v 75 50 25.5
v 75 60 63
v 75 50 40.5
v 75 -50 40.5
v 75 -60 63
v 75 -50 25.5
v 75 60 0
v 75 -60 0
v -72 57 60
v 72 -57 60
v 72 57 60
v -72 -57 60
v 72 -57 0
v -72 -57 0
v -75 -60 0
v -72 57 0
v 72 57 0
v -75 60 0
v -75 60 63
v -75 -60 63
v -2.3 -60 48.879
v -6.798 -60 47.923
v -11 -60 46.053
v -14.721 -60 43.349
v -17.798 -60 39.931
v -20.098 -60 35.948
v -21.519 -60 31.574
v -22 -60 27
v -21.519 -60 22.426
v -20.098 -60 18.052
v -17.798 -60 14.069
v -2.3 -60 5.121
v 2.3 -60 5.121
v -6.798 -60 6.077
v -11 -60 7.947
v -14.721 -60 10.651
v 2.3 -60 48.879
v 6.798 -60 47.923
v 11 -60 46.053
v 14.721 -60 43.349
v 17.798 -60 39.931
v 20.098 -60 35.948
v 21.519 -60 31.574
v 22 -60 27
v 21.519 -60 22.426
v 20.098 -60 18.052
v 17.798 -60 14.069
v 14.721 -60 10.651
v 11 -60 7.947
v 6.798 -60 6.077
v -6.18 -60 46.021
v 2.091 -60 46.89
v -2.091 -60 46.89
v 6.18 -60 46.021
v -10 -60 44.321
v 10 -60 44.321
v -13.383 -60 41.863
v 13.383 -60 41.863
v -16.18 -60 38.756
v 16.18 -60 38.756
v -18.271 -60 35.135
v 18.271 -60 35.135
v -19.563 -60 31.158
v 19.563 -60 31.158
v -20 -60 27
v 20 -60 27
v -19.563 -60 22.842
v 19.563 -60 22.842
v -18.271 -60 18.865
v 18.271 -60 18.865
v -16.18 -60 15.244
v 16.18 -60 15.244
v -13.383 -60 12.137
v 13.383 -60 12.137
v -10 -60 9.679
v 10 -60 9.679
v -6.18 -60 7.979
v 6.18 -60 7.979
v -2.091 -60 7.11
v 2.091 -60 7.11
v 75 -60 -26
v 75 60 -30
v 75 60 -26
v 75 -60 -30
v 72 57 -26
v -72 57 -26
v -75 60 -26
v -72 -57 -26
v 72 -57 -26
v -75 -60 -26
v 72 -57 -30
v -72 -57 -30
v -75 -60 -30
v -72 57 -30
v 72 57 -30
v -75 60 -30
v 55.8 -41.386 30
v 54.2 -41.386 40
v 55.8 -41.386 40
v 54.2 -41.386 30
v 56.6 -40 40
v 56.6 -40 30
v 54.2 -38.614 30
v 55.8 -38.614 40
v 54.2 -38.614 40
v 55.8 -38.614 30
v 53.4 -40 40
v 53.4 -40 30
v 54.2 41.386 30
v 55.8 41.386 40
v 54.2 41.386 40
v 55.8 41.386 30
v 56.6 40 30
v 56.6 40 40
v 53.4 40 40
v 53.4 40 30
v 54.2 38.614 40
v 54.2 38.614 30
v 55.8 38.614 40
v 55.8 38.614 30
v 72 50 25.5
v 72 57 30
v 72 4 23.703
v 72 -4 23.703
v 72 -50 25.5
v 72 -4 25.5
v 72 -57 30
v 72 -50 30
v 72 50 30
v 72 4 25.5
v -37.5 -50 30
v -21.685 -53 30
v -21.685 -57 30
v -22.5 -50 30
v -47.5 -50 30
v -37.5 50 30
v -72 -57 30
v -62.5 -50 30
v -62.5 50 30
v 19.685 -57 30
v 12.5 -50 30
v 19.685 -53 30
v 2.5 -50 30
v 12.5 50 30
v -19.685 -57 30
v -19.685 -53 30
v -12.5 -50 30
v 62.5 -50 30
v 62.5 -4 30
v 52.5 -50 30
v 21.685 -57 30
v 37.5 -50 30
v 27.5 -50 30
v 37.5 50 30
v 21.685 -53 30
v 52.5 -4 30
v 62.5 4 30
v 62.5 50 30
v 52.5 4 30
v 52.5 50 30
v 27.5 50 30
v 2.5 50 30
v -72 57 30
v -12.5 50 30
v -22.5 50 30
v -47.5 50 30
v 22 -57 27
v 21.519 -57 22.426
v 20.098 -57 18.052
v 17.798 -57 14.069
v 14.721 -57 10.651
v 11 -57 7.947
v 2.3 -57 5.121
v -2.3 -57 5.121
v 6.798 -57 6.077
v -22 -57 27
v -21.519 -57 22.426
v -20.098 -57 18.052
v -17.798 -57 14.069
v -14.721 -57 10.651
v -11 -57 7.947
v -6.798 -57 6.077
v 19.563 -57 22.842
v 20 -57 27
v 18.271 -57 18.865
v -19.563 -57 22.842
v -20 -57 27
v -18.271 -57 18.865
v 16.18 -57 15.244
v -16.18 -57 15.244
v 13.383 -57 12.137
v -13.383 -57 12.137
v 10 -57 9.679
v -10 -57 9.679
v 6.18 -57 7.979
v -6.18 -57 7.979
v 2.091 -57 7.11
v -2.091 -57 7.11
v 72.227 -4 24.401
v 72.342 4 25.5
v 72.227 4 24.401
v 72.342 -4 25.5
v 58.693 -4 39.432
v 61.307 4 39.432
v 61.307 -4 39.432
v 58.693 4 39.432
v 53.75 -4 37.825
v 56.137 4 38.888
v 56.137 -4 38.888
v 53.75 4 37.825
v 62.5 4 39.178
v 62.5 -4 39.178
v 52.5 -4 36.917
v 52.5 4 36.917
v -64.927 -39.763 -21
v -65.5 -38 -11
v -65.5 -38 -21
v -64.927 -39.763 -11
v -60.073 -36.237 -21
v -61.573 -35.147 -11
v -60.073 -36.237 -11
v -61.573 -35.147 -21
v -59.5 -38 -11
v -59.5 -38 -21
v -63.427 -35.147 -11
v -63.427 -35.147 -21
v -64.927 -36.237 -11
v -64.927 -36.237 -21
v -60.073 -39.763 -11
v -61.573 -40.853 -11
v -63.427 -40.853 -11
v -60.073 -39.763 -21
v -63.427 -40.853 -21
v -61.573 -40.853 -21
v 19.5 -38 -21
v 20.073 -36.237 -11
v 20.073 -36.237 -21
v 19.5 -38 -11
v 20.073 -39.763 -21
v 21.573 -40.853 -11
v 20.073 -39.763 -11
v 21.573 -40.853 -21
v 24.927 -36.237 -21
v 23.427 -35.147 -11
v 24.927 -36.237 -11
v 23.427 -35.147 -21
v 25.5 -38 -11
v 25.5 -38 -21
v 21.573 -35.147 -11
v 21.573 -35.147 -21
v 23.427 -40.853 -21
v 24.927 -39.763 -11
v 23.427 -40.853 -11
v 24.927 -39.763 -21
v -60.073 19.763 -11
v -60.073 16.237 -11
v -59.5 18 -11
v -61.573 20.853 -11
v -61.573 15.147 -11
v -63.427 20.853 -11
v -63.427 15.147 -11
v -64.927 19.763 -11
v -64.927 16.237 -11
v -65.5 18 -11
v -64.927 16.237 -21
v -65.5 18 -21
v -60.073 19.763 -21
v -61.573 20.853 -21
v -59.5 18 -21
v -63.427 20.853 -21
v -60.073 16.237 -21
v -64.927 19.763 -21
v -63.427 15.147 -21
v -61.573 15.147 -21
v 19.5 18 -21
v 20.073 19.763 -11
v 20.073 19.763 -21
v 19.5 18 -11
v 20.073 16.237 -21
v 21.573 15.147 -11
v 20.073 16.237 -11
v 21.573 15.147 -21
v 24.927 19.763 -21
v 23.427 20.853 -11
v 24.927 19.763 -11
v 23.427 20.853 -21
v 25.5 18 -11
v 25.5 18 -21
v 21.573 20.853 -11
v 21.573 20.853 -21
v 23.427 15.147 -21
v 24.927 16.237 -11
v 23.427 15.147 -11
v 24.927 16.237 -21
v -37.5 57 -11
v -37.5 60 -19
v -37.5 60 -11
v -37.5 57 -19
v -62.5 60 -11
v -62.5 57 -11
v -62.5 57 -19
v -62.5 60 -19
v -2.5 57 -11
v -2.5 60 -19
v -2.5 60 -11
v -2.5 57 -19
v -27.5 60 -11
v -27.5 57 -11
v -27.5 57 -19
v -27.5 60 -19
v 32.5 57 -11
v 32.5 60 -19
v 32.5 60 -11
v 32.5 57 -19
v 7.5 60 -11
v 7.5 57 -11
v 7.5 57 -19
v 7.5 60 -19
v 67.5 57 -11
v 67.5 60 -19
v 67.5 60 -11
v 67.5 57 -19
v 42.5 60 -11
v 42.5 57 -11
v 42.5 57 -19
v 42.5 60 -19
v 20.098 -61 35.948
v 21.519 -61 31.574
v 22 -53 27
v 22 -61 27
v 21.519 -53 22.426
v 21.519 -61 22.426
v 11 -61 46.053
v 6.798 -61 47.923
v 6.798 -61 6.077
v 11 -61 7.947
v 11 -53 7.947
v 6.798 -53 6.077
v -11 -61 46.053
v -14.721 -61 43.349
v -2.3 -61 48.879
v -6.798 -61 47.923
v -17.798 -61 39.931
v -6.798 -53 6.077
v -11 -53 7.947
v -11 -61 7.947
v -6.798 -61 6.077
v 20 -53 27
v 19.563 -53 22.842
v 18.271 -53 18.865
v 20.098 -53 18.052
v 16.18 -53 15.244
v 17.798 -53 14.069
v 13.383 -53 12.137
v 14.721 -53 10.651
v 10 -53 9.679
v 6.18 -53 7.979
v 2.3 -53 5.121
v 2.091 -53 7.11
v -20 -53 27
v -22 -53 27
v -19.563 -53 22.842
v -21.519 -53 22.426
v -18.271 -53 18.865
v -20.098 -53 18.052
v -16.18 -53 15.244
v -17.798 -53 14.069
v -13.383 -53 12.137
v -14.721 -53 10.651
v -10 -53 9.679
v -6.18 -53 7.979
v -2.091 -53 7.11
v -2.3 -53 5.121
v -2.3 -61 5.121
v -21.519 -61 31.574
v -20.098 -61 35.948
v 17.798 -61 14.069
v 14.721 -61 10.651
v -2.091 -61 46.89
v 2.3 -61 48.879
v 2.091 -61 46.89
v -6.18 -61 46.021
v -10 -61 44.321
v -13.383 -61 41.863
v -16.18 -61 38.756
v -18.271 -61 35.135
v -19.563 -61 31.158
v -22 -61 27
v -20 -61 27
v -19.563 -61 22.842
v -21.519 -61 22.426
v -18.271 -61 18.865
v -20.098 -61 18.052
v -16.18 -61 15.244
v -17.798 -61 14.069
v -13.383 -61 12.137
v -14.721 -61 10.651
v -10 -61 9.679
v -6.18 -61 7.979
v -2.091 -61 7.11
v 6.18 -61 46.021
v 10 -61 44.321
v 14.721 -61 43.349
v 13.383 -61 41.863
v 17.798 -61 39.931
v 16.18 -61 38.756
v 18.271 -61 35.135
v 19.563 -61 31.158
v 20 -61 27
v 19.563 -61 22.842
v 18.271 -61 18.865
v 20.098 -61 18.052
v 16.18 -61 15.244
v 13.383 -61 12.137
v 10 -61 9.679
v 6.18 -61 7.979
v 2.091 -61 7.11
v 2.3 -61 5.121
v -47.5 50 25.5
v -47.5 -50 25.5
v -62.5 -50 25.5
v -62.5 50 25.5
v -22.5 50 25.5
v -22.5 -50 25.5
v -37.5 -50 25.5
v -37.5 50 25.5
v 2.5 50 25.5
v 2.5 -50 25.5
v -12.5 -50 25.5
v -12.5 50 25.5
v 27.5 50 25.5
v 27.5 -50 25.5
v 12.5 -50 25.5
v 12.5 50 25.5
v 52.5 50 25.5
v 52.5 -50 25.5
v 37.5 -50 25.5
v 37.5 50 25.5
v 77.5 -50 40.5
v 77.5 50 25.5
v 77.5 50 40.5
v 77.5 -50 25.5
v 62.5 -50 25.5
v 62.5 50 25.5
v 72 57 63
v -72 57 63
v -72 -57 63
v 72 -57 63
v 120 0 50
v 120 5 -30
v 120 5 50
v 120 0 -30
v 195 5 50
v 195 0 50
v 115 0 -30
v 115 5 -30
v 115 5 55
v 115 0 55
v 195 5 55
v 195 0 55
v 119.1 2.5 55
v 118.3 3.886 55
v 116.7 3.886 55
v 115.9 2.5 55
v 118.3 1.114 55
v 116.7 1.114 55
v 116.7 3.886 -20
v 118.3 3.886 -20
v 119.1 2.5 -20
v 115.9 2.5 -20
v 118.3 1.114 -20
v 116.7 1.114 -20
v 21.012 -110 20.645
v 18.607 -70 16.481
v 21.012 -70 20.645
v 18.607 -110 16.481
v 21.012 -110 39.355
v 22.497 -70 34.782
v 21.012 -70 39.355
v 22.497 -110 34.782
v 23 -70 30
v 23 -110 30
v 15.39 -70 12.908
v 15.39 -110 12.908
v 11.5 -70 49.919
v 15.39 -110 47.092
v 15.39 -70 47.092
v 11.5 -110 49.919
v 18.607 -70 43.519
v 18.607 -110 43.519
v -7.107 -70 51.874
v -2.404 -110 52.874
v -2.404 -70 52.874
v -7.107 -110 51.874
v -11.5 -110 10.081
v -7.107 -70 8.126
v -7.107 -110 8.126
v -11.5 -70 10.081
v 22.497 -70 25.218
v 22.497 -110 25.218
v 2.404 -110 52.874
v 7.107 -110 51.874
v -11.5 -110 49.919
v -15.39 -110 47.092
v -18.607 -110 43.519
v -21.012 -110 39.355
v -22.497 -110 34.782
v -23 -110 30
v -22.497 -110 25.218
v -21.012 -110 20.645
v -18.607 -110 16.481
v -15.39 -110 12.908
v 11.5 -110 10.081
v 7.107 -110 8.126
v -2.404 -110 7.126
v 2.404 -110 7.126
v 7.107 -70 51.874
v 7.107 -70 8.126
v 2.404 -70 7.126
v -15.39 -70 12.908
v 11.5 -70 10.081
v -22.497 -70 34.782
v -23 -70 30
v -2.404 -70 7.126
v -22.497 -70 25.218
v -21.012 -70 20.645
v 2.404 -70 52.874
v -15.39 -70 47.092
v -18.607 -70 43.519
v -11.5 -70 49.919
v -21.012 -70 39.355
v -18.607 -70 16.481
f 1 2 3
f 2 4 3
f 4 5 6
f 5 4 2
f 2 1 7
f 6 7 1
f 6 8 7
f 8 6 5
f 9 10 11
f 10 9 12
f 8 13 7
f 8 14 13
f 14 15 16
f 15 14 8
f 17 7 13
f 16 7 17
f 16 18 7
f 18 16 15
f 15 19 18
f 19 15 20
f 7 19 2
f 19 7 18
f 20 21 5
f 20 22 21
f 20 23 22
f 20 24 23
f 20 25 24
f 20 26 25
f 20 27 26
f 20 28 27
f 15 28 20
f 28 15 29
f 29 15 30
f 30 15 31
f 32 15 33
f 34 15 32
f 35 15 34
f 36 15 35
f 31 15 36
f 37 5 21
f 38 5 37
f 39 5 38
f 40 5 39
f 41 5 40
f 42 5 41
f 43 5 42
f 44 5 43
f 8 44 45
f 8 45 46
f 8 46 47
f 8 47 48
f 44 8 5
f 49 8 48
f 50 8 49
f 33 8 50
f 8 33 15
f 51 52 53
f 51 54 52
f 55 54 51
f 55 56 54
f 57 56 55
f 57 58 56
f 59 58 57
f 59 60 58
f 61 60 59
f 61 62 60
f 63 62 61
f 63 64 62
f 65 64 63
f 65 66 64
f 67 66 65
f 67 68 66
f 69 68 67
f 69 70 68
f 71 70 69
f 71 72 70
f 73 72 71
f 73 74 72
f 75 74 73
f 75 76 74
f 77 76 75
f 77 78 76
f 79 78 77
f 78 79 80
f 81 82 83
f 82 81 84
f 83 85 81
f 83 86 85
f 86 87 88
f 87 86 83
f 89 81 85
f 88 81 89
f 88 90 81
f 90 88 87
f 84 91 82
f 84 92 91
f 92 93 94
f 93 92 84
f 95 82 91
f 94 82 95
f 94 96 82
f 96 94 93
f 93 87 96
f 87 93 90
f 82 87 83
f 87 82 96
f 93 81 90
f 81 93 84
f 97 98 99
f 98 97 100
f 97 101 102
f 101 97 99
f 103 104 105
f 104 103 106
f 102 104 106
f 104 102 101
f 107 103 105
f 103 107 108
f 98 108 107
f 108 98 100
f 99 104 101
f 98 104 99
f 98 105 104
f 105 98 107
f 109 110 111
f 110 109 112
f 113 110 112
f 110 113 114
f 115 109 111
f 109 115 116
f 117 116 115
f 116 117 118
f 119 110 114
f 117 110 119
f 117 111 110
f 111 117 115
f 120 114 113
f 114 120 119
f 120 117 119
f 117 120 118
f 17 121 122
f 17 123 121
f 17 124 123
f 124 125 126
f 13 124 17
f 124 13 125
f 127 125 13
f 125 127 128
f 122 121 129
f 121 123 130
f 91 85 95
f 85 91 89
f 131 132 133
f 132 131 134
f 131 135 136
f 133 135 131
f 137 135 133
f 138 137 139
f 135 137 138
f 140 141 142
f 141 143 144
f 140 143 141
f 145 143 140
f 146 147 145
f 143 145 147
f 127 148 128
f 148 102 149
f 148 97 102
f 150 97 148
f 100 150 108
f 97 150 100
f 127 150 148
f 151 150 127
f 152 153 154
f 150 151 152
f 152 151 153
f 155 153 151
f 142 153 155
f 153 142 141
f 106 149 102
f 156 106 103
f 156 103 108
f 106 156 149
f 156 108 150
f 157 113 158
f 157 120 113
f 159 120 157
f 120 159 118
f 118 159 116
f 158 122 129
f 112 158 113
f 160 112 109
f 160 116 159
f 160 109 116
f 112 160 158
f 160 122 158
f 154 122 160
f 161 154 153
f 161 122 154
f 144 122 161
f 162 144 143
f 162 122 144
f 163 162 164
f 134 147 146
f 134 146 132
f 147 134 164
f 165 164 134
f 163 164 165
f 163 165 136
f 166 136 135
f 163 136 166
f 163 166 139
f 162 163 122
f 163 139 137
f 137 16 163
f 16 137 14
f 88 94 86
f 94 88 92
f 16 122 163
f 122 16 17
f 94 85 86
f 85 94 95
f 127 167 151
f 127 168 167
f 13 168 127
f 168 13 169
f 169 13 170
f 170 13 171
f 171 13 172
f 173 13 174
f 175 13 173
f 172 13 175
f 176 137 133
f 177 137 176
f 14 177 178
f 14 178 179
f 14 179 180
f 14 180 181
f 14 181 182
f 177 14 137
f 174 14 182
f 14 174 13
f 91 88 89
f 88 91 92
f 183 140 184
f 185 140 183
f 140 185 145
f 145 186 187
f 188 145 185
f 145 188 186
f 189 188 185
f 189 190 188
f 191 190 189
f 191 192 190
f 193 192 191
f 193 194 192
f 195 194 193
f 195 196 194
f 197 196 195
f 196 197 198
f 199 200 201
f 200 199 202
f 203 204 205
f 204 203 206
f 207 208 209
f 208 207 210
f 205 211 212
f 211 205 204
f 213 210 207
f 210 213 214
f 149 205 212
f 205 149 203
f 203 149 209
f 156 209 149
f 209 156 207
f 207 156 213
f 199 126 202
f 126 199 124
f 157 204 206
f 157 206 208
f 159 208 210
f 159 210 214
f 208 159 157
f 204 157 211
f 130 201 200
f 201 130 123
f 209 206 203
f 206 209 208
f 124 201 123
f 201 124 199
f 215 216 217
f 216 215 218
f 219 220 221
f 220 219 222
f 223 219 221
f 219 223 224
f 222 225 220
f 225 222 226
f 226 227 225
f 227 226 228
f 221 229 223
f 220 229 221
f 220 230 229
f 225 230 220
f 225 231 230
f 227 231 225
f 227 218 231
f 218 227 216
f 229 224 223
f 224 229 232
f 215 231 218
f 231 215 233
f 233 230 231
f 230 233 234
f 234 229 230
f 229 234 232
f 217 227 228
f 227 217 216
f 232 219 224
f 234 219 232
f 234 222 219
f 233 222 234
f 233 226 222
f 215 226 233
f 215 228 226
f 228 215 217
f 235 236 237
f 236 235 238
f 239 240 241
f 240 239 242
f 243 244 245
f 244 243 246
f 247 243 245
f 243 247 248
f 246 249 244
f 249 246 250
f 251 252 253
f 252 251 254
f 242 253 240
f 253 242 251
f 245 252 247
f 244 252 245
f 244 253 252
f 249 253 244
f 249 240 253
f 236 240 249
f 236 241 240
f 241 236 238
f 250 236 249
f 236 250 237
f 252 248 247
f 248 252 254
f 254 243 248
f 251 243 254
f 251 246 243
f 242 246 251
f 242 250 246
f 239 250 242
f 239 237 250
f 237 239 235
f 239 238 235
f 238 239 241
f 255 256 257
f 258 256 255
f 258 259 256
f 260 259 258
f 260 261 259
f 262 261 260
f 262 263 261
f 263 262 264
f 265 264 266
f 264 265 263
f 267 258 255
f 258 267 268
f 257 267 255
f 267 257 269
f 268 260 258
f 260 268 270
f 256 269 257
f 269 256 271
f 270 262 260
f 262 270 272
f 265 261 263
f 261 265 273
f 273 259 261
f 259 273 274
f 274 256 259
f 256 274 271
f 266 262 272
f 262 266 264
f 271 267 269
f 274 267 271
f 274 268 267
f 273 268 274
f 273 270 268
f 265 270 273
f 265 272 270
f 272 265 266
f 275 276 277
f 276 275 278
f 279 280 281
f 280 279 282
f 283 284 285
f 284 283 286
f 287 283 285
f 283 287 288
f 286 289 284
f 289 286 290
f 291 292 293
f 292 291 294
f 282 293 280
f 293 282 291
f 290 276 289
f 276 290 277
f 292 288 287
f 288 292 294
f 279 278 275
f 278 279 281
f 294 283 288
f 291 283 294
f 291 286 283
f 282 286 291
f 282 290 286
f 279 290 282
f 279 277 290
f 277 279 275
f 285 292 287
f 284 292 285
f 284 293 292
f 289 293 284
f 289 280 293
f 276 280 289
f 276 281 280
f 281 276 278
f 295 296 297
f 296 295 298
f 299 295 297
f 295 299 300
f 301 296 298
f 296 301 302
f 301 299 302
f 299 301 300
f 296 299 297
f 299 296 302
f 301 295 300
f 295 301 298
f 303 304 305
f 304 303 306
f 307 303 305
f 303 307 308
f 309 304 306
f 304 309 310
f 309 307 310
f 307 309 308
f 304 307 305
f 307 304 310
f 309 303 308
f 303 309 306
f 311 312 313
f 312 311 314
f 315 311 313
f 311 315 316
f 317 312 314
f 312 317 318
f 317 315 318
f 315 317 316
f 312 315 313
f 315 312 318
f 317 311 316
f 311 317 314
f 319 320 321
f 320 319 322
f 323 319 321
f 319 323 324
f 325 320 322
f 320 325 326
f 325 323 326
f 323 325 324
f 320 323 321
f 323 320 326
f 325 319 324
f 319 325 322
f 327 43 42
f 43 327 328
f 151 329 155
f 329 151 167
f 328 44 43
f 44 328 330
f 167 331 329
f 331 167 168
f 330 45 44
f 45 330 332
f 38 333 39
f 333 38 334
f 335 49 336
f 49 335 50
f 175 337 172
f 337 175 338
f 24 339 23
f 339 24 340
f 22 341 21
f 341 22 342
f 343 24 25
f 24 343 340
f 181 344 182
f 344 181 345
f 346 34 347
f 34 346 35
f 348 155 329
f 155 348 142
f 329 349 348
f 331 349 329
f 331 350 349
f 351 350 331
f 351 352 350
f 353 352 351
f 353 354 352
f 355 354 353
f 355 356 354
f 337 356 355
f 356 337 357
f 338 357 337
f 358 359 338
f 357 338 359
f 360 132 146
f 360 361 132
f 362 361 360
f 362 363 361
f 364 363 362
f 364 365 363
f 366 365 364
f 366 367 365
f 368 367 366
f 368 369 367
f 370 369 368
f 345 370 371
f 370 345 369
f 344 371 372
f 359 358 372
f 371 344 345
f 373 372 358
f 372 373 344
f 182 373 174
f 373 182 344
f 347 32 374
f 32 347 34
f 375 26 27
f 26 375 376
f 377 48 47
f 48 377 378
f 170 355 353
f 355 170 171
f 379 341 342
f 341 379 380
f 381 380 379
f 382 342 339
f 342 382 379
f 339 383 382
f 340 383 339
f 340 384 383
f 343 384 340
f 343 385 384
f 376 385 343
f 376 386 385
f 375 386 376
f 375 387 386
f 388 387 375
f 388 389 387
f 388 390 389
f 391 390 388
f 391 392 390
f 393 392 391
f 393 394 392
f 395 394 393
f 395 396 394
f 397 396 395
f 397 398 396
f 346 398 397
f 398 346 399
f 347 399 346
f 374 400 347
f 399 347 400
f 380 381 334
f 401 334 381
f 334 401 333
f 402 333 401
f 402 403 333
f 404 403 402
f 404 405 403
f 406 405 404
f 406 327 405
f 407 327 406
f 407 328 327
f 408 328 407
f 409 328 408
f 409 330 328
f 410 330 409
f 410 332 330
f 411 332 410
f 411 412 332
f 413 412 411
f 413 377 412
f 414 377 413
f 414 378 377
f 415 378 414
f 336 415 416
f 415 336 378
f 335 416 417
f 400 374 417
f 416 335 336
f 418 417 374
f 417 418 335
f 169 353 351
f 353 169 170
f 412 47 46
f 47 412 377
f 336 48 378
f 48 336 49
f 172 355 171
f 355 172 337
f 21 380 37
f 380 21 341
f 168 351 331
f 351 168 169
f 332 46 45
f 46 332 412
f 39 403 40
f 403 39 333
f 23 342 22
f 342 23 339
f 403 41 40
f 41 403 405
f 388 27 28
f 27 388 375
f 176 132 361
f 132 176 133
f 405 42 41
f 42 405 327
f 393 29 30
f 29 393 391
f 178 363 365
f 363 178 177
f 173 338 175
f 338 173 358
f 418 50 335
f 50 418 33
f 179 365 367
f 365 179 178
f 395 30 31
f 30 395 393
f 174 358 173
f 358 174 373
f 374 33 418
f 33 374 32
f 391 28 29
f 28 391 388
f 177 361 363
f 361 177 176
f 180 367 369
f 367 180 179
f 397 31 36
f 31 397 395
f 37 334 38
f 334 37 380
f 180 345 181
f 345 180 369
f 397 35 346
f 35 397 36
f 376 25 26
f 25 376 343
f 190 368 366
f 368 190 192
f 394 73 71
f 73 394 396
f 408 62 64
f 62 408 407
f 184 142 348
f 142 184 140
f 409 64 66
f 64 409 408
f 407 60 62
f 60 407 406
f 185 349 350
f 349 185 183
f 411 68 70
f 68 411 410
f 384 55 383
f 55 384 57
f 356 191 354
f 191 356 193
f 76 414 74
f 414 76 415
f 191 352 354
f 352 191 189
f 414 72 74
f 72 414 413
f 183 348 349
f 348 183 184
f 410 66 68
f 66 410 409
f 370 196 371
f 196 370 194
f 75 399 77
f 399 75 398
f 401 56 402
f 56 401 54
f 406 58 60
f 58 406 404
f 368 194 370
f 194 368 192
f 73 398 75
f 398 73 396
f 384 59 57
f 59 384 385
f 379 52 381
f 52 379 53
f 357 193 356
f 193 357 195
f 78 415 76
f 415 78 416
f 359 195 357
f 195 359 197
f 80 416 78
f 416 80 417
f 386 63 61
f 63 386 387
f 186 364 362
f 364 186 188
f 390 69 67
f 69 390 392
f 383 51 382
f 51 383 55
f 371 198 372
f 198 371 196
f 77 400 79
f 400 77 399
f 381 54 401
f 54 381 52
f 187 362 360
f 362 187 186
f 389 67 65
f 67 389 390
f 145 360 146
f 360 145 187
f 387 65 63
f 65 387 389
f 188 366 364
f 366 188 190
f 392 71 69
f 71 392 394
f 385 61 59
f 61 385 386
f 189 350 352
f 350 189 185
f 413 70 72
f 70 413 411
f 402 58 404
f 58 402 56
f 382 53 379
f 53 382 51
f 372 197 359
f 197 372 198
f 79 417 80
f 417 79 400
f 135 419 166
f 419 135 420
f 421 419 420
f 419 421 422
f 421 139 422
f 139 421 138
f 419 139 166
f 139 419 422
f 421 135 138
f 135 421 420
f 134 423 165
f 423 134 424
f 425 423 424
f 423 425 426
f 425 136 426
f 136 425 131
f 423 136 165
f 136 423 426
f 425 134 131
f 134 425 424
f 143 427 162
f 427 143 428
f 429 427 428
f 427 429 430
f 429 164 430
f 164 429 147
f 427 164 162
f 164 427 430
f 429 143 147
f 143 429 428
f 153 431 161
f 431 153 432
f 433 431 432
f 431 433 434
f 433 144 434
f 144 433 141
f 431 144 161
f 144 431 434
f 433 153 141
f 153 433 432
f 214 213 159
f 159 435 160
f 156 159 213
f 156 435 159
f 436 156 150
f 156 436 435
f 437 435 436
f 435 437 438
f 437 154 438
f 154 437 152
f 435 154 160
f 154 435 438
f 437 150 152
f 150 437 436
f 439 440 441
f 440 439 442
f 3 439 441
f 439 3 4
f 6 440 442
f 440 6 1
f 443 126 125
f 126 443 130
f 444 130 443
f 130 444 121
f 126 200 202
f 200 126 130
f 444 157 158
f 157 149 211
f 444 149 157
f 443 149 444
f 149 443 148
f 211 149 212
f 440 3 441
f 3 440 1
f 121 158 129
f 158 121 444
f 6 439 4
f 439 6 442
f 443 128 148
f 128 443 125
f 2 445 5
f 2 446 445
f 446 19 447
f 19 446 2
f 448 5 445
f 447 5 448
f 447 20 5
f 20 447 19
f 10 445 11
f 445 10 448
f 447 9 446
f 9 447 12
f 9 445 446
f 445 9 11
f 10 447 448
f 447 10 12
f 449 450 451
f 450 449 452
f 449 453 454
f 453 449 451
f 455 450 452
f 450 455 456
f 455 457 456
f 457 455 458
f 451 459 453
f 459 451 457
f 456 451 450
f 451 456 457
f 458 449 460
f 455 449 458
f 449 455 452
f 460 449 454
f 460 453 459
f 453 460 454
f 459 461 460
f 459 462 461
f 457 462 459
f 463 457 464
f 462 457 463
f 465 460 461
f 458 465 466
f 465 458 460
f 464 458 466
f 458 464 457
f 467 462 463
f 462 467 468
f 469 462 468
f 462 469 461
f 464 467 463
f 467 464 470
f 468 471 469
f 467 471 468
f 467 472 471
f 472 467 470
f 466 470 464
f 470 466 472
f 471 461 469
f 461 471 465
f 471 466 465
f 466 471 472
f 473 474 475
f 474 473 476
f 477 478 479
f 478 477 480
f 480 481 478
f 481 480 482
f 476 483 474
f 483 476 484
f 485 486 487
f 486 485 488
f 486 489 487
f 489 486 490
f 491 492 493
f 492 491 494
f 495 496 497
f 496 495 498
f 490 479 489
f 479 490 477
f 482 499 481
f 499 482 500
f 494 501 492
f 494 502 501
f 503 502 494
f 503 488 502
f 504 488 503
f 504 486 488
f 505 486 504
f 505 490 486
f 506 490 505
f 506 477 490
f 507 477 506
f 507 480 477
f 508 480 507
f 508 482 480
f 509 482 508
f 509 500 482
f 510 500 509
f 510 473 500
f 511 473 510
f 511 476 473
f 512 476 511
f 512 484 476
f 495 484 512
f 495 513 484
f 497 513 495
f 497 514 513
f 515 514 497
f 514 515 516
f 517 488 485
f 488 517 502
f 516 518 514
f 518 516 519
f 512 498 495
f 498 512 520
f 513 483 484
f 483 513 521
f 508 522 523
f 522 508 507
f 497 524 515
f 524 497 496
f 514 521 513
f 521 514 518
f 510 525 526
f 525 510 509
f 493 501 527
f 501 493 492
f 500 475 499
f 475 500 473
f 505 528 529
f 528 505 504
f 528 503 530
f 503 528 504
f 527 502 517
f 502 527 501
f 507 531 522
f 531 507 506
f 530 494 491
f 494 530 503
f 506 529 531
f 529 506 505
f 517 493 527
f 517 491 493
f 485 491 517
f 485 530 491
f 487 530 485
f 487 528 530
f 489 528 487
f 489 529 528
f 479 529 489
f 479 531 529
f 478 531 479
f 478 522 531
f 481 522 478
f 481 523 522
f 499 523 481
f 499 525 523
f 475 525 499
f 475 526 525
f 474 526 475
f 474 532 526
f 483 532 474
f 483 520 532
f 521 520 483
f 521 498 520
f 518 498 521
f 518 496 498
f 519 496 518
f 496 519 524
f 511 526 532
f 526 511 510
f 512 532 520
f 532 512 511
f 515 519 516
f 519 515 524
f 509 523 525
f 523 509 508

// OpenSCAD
// Texas Wildlife ID - 3D Printed Enclosure v3 with thermal management
enclosure_width = 150;
enclosure_depth = 120;
enclosure_height = 60;
wall_thickness = 3;
base_thickness = 4;
lid_thickness = 3;
standoff_height = 10;

mount_hole_dia = 3.2;
mount_grid = [[20,20],[130,20],[20,100],[130,100]];

camera_hole_dia = 25;
cable_gland_dia = 12;

// Solar panel bracket params
solar_panel_width = 200;
solar_panel_depth = 150;
bracket_length = 80;
bracket_thickness = 5;

// Thermal management params
fan_dia = 40;
fan_thickness = 10;
chimney_height = 40;
heatsink_fin_height = 15;

module base(){
    difference(){
        union(){
            translate([0,0,enclosure_height/2]) cube([enclosure_width, enclosure_depth, enclosure_height], center=true);
            translate([0,0,-enclosure_height/2 + base_thickness/2]) cube([enclosure_width, enclosure_depth, base_thickness], center=true);
        }
        translate([0,0,0]) cube([enclosure_width-2*wall_thickness, enclosure_depth-2*wall_thickness, enclosure_height], center=true);
        for(p = mount_grid){
            translate([p[0]-enclosure_width/2, p[1]-enclosure_depth/2, -enclosure_height/2]) cylinder(h=enclosure_height+10, d=mount_hole_dia, center=false);
        }
        // Camera cutout
        translate([enclosure_width/2 - 15, 0, enclosure_height/2 - wall_thickness])
        rotate([90,0,0])
        cylinder(h=wall_thickness+5, d=camera_hole_dia, center=true);
        // Cable glands
        translate([-enclosure_width/2 + 20, 0, -enclosure_height/2 + wall_thickness])
        rotate([90,0,90])
        cylinder(h=wall_thickness+5, d=cable_gland_dia, center=true);
        translate([enclosure_width/2 - 20, 0, -enclosure_height/2 + wall_thickness])
        rotate([90,0,90])
        cylinder(h=wall_thickness+5, d=cable_gland_dia, center=true);
    }
}

module lid(){
    difference(){
        translate([0,0,enclosure_height + lid_thickness/2]) cube([enclosure_width, enclosure_depth, lid_thickness], center=true);
        translate([0,0,enclosure_height + lid_thickness/2 - 0.5])
        cube([enclosure_width-2*wall_thickness, enclosure_depth-2*wall_thickness, lid_thickness+2], center=true);
    }
}

module pi_standoffs(){
    translate([-20, -10, -enclosure_height/2 + base_thickness + standoff_height/2]){
        for(i=[0:3]){
            x = i%2==0 ? -42.5 : 42.5;
            y = i<2 ? -28 : 28;
            translate([x, y, 0]) cylinder(h=standoff_height, d=6);
        }
    }
}

module vents(){
    // Intake vents low on side
    for(i=[0:3]){
        translate([-enclosure_width/2+25 + i*35, enclosure_depth/2 - wall_thickness/2, -enclosure_height/2 + 15])
        cube([25, wall_thickness, 8], center=true);
    }
}

module fan_mount(){
    // 40mm fan mount on top
    translate([0, -enclosure_depth/2 + wall_thickness, enclosure_height/2 - wall_thickness])
    rotate([90,0,0])
    difference(){
        cylinder(h=wall_thickness+5, d=fan_dia+4, center=true);
        cylinder(h=wall_thickness+10, d=fan_dia, center=true);
    }
}

module chimney(){
    // Exhaust chimney above fan
    translate([0, -enclosure_depth/2 - 10, enclosure_height/2])
    rotate([90,0,0])
    cylinder(h=chimney_height, d=fan_dia+6, center=false);
}

module heatsink_fins(){
    // Passive fins on top of enclosure
    for(i=[0:5]){
        translate([ -enclosure_width/2 + 20 + i*25, 0, enclosure_height/2 + lid_thickness])
        cube([15, enclosure_depth-20, heatsink_fin_height], center=true);
    }
}

module solar_bracket(){
    translate([enclosure_width/2 + bracket_length/2, 0, -enclosure_height/2])
    difference(){
        union(){
            cube([bracket_thickness, bracket_thickness, enclosure_height + 20], center=false);
            translate([0, 0, enclosure_height + 20])
            cube([bracket_length, bracket_thickness, bracket_thickness], center=false);
        }
        translate([bracket_thickness/2, bracket_thickness/2, 10])
        cylinder(h=enclosure_height+30, d=mount_hole_dia, center=false);
    }
}

module cable_gland(){
    difference(){
        cylinder(h=15, d=20, center=false);
        translate([0,0,2]) cylinder(h=13, d=12, center=false);
        translate([0,0,2]) cylinder(h=13, d=6, center=false);
    }
}

base();
pi_standoffs();
vents();
fan_mount();
chimney();
heatsink_fins();
lid();
solar_bracket();
// cable_gland(); // uncomment to preview
